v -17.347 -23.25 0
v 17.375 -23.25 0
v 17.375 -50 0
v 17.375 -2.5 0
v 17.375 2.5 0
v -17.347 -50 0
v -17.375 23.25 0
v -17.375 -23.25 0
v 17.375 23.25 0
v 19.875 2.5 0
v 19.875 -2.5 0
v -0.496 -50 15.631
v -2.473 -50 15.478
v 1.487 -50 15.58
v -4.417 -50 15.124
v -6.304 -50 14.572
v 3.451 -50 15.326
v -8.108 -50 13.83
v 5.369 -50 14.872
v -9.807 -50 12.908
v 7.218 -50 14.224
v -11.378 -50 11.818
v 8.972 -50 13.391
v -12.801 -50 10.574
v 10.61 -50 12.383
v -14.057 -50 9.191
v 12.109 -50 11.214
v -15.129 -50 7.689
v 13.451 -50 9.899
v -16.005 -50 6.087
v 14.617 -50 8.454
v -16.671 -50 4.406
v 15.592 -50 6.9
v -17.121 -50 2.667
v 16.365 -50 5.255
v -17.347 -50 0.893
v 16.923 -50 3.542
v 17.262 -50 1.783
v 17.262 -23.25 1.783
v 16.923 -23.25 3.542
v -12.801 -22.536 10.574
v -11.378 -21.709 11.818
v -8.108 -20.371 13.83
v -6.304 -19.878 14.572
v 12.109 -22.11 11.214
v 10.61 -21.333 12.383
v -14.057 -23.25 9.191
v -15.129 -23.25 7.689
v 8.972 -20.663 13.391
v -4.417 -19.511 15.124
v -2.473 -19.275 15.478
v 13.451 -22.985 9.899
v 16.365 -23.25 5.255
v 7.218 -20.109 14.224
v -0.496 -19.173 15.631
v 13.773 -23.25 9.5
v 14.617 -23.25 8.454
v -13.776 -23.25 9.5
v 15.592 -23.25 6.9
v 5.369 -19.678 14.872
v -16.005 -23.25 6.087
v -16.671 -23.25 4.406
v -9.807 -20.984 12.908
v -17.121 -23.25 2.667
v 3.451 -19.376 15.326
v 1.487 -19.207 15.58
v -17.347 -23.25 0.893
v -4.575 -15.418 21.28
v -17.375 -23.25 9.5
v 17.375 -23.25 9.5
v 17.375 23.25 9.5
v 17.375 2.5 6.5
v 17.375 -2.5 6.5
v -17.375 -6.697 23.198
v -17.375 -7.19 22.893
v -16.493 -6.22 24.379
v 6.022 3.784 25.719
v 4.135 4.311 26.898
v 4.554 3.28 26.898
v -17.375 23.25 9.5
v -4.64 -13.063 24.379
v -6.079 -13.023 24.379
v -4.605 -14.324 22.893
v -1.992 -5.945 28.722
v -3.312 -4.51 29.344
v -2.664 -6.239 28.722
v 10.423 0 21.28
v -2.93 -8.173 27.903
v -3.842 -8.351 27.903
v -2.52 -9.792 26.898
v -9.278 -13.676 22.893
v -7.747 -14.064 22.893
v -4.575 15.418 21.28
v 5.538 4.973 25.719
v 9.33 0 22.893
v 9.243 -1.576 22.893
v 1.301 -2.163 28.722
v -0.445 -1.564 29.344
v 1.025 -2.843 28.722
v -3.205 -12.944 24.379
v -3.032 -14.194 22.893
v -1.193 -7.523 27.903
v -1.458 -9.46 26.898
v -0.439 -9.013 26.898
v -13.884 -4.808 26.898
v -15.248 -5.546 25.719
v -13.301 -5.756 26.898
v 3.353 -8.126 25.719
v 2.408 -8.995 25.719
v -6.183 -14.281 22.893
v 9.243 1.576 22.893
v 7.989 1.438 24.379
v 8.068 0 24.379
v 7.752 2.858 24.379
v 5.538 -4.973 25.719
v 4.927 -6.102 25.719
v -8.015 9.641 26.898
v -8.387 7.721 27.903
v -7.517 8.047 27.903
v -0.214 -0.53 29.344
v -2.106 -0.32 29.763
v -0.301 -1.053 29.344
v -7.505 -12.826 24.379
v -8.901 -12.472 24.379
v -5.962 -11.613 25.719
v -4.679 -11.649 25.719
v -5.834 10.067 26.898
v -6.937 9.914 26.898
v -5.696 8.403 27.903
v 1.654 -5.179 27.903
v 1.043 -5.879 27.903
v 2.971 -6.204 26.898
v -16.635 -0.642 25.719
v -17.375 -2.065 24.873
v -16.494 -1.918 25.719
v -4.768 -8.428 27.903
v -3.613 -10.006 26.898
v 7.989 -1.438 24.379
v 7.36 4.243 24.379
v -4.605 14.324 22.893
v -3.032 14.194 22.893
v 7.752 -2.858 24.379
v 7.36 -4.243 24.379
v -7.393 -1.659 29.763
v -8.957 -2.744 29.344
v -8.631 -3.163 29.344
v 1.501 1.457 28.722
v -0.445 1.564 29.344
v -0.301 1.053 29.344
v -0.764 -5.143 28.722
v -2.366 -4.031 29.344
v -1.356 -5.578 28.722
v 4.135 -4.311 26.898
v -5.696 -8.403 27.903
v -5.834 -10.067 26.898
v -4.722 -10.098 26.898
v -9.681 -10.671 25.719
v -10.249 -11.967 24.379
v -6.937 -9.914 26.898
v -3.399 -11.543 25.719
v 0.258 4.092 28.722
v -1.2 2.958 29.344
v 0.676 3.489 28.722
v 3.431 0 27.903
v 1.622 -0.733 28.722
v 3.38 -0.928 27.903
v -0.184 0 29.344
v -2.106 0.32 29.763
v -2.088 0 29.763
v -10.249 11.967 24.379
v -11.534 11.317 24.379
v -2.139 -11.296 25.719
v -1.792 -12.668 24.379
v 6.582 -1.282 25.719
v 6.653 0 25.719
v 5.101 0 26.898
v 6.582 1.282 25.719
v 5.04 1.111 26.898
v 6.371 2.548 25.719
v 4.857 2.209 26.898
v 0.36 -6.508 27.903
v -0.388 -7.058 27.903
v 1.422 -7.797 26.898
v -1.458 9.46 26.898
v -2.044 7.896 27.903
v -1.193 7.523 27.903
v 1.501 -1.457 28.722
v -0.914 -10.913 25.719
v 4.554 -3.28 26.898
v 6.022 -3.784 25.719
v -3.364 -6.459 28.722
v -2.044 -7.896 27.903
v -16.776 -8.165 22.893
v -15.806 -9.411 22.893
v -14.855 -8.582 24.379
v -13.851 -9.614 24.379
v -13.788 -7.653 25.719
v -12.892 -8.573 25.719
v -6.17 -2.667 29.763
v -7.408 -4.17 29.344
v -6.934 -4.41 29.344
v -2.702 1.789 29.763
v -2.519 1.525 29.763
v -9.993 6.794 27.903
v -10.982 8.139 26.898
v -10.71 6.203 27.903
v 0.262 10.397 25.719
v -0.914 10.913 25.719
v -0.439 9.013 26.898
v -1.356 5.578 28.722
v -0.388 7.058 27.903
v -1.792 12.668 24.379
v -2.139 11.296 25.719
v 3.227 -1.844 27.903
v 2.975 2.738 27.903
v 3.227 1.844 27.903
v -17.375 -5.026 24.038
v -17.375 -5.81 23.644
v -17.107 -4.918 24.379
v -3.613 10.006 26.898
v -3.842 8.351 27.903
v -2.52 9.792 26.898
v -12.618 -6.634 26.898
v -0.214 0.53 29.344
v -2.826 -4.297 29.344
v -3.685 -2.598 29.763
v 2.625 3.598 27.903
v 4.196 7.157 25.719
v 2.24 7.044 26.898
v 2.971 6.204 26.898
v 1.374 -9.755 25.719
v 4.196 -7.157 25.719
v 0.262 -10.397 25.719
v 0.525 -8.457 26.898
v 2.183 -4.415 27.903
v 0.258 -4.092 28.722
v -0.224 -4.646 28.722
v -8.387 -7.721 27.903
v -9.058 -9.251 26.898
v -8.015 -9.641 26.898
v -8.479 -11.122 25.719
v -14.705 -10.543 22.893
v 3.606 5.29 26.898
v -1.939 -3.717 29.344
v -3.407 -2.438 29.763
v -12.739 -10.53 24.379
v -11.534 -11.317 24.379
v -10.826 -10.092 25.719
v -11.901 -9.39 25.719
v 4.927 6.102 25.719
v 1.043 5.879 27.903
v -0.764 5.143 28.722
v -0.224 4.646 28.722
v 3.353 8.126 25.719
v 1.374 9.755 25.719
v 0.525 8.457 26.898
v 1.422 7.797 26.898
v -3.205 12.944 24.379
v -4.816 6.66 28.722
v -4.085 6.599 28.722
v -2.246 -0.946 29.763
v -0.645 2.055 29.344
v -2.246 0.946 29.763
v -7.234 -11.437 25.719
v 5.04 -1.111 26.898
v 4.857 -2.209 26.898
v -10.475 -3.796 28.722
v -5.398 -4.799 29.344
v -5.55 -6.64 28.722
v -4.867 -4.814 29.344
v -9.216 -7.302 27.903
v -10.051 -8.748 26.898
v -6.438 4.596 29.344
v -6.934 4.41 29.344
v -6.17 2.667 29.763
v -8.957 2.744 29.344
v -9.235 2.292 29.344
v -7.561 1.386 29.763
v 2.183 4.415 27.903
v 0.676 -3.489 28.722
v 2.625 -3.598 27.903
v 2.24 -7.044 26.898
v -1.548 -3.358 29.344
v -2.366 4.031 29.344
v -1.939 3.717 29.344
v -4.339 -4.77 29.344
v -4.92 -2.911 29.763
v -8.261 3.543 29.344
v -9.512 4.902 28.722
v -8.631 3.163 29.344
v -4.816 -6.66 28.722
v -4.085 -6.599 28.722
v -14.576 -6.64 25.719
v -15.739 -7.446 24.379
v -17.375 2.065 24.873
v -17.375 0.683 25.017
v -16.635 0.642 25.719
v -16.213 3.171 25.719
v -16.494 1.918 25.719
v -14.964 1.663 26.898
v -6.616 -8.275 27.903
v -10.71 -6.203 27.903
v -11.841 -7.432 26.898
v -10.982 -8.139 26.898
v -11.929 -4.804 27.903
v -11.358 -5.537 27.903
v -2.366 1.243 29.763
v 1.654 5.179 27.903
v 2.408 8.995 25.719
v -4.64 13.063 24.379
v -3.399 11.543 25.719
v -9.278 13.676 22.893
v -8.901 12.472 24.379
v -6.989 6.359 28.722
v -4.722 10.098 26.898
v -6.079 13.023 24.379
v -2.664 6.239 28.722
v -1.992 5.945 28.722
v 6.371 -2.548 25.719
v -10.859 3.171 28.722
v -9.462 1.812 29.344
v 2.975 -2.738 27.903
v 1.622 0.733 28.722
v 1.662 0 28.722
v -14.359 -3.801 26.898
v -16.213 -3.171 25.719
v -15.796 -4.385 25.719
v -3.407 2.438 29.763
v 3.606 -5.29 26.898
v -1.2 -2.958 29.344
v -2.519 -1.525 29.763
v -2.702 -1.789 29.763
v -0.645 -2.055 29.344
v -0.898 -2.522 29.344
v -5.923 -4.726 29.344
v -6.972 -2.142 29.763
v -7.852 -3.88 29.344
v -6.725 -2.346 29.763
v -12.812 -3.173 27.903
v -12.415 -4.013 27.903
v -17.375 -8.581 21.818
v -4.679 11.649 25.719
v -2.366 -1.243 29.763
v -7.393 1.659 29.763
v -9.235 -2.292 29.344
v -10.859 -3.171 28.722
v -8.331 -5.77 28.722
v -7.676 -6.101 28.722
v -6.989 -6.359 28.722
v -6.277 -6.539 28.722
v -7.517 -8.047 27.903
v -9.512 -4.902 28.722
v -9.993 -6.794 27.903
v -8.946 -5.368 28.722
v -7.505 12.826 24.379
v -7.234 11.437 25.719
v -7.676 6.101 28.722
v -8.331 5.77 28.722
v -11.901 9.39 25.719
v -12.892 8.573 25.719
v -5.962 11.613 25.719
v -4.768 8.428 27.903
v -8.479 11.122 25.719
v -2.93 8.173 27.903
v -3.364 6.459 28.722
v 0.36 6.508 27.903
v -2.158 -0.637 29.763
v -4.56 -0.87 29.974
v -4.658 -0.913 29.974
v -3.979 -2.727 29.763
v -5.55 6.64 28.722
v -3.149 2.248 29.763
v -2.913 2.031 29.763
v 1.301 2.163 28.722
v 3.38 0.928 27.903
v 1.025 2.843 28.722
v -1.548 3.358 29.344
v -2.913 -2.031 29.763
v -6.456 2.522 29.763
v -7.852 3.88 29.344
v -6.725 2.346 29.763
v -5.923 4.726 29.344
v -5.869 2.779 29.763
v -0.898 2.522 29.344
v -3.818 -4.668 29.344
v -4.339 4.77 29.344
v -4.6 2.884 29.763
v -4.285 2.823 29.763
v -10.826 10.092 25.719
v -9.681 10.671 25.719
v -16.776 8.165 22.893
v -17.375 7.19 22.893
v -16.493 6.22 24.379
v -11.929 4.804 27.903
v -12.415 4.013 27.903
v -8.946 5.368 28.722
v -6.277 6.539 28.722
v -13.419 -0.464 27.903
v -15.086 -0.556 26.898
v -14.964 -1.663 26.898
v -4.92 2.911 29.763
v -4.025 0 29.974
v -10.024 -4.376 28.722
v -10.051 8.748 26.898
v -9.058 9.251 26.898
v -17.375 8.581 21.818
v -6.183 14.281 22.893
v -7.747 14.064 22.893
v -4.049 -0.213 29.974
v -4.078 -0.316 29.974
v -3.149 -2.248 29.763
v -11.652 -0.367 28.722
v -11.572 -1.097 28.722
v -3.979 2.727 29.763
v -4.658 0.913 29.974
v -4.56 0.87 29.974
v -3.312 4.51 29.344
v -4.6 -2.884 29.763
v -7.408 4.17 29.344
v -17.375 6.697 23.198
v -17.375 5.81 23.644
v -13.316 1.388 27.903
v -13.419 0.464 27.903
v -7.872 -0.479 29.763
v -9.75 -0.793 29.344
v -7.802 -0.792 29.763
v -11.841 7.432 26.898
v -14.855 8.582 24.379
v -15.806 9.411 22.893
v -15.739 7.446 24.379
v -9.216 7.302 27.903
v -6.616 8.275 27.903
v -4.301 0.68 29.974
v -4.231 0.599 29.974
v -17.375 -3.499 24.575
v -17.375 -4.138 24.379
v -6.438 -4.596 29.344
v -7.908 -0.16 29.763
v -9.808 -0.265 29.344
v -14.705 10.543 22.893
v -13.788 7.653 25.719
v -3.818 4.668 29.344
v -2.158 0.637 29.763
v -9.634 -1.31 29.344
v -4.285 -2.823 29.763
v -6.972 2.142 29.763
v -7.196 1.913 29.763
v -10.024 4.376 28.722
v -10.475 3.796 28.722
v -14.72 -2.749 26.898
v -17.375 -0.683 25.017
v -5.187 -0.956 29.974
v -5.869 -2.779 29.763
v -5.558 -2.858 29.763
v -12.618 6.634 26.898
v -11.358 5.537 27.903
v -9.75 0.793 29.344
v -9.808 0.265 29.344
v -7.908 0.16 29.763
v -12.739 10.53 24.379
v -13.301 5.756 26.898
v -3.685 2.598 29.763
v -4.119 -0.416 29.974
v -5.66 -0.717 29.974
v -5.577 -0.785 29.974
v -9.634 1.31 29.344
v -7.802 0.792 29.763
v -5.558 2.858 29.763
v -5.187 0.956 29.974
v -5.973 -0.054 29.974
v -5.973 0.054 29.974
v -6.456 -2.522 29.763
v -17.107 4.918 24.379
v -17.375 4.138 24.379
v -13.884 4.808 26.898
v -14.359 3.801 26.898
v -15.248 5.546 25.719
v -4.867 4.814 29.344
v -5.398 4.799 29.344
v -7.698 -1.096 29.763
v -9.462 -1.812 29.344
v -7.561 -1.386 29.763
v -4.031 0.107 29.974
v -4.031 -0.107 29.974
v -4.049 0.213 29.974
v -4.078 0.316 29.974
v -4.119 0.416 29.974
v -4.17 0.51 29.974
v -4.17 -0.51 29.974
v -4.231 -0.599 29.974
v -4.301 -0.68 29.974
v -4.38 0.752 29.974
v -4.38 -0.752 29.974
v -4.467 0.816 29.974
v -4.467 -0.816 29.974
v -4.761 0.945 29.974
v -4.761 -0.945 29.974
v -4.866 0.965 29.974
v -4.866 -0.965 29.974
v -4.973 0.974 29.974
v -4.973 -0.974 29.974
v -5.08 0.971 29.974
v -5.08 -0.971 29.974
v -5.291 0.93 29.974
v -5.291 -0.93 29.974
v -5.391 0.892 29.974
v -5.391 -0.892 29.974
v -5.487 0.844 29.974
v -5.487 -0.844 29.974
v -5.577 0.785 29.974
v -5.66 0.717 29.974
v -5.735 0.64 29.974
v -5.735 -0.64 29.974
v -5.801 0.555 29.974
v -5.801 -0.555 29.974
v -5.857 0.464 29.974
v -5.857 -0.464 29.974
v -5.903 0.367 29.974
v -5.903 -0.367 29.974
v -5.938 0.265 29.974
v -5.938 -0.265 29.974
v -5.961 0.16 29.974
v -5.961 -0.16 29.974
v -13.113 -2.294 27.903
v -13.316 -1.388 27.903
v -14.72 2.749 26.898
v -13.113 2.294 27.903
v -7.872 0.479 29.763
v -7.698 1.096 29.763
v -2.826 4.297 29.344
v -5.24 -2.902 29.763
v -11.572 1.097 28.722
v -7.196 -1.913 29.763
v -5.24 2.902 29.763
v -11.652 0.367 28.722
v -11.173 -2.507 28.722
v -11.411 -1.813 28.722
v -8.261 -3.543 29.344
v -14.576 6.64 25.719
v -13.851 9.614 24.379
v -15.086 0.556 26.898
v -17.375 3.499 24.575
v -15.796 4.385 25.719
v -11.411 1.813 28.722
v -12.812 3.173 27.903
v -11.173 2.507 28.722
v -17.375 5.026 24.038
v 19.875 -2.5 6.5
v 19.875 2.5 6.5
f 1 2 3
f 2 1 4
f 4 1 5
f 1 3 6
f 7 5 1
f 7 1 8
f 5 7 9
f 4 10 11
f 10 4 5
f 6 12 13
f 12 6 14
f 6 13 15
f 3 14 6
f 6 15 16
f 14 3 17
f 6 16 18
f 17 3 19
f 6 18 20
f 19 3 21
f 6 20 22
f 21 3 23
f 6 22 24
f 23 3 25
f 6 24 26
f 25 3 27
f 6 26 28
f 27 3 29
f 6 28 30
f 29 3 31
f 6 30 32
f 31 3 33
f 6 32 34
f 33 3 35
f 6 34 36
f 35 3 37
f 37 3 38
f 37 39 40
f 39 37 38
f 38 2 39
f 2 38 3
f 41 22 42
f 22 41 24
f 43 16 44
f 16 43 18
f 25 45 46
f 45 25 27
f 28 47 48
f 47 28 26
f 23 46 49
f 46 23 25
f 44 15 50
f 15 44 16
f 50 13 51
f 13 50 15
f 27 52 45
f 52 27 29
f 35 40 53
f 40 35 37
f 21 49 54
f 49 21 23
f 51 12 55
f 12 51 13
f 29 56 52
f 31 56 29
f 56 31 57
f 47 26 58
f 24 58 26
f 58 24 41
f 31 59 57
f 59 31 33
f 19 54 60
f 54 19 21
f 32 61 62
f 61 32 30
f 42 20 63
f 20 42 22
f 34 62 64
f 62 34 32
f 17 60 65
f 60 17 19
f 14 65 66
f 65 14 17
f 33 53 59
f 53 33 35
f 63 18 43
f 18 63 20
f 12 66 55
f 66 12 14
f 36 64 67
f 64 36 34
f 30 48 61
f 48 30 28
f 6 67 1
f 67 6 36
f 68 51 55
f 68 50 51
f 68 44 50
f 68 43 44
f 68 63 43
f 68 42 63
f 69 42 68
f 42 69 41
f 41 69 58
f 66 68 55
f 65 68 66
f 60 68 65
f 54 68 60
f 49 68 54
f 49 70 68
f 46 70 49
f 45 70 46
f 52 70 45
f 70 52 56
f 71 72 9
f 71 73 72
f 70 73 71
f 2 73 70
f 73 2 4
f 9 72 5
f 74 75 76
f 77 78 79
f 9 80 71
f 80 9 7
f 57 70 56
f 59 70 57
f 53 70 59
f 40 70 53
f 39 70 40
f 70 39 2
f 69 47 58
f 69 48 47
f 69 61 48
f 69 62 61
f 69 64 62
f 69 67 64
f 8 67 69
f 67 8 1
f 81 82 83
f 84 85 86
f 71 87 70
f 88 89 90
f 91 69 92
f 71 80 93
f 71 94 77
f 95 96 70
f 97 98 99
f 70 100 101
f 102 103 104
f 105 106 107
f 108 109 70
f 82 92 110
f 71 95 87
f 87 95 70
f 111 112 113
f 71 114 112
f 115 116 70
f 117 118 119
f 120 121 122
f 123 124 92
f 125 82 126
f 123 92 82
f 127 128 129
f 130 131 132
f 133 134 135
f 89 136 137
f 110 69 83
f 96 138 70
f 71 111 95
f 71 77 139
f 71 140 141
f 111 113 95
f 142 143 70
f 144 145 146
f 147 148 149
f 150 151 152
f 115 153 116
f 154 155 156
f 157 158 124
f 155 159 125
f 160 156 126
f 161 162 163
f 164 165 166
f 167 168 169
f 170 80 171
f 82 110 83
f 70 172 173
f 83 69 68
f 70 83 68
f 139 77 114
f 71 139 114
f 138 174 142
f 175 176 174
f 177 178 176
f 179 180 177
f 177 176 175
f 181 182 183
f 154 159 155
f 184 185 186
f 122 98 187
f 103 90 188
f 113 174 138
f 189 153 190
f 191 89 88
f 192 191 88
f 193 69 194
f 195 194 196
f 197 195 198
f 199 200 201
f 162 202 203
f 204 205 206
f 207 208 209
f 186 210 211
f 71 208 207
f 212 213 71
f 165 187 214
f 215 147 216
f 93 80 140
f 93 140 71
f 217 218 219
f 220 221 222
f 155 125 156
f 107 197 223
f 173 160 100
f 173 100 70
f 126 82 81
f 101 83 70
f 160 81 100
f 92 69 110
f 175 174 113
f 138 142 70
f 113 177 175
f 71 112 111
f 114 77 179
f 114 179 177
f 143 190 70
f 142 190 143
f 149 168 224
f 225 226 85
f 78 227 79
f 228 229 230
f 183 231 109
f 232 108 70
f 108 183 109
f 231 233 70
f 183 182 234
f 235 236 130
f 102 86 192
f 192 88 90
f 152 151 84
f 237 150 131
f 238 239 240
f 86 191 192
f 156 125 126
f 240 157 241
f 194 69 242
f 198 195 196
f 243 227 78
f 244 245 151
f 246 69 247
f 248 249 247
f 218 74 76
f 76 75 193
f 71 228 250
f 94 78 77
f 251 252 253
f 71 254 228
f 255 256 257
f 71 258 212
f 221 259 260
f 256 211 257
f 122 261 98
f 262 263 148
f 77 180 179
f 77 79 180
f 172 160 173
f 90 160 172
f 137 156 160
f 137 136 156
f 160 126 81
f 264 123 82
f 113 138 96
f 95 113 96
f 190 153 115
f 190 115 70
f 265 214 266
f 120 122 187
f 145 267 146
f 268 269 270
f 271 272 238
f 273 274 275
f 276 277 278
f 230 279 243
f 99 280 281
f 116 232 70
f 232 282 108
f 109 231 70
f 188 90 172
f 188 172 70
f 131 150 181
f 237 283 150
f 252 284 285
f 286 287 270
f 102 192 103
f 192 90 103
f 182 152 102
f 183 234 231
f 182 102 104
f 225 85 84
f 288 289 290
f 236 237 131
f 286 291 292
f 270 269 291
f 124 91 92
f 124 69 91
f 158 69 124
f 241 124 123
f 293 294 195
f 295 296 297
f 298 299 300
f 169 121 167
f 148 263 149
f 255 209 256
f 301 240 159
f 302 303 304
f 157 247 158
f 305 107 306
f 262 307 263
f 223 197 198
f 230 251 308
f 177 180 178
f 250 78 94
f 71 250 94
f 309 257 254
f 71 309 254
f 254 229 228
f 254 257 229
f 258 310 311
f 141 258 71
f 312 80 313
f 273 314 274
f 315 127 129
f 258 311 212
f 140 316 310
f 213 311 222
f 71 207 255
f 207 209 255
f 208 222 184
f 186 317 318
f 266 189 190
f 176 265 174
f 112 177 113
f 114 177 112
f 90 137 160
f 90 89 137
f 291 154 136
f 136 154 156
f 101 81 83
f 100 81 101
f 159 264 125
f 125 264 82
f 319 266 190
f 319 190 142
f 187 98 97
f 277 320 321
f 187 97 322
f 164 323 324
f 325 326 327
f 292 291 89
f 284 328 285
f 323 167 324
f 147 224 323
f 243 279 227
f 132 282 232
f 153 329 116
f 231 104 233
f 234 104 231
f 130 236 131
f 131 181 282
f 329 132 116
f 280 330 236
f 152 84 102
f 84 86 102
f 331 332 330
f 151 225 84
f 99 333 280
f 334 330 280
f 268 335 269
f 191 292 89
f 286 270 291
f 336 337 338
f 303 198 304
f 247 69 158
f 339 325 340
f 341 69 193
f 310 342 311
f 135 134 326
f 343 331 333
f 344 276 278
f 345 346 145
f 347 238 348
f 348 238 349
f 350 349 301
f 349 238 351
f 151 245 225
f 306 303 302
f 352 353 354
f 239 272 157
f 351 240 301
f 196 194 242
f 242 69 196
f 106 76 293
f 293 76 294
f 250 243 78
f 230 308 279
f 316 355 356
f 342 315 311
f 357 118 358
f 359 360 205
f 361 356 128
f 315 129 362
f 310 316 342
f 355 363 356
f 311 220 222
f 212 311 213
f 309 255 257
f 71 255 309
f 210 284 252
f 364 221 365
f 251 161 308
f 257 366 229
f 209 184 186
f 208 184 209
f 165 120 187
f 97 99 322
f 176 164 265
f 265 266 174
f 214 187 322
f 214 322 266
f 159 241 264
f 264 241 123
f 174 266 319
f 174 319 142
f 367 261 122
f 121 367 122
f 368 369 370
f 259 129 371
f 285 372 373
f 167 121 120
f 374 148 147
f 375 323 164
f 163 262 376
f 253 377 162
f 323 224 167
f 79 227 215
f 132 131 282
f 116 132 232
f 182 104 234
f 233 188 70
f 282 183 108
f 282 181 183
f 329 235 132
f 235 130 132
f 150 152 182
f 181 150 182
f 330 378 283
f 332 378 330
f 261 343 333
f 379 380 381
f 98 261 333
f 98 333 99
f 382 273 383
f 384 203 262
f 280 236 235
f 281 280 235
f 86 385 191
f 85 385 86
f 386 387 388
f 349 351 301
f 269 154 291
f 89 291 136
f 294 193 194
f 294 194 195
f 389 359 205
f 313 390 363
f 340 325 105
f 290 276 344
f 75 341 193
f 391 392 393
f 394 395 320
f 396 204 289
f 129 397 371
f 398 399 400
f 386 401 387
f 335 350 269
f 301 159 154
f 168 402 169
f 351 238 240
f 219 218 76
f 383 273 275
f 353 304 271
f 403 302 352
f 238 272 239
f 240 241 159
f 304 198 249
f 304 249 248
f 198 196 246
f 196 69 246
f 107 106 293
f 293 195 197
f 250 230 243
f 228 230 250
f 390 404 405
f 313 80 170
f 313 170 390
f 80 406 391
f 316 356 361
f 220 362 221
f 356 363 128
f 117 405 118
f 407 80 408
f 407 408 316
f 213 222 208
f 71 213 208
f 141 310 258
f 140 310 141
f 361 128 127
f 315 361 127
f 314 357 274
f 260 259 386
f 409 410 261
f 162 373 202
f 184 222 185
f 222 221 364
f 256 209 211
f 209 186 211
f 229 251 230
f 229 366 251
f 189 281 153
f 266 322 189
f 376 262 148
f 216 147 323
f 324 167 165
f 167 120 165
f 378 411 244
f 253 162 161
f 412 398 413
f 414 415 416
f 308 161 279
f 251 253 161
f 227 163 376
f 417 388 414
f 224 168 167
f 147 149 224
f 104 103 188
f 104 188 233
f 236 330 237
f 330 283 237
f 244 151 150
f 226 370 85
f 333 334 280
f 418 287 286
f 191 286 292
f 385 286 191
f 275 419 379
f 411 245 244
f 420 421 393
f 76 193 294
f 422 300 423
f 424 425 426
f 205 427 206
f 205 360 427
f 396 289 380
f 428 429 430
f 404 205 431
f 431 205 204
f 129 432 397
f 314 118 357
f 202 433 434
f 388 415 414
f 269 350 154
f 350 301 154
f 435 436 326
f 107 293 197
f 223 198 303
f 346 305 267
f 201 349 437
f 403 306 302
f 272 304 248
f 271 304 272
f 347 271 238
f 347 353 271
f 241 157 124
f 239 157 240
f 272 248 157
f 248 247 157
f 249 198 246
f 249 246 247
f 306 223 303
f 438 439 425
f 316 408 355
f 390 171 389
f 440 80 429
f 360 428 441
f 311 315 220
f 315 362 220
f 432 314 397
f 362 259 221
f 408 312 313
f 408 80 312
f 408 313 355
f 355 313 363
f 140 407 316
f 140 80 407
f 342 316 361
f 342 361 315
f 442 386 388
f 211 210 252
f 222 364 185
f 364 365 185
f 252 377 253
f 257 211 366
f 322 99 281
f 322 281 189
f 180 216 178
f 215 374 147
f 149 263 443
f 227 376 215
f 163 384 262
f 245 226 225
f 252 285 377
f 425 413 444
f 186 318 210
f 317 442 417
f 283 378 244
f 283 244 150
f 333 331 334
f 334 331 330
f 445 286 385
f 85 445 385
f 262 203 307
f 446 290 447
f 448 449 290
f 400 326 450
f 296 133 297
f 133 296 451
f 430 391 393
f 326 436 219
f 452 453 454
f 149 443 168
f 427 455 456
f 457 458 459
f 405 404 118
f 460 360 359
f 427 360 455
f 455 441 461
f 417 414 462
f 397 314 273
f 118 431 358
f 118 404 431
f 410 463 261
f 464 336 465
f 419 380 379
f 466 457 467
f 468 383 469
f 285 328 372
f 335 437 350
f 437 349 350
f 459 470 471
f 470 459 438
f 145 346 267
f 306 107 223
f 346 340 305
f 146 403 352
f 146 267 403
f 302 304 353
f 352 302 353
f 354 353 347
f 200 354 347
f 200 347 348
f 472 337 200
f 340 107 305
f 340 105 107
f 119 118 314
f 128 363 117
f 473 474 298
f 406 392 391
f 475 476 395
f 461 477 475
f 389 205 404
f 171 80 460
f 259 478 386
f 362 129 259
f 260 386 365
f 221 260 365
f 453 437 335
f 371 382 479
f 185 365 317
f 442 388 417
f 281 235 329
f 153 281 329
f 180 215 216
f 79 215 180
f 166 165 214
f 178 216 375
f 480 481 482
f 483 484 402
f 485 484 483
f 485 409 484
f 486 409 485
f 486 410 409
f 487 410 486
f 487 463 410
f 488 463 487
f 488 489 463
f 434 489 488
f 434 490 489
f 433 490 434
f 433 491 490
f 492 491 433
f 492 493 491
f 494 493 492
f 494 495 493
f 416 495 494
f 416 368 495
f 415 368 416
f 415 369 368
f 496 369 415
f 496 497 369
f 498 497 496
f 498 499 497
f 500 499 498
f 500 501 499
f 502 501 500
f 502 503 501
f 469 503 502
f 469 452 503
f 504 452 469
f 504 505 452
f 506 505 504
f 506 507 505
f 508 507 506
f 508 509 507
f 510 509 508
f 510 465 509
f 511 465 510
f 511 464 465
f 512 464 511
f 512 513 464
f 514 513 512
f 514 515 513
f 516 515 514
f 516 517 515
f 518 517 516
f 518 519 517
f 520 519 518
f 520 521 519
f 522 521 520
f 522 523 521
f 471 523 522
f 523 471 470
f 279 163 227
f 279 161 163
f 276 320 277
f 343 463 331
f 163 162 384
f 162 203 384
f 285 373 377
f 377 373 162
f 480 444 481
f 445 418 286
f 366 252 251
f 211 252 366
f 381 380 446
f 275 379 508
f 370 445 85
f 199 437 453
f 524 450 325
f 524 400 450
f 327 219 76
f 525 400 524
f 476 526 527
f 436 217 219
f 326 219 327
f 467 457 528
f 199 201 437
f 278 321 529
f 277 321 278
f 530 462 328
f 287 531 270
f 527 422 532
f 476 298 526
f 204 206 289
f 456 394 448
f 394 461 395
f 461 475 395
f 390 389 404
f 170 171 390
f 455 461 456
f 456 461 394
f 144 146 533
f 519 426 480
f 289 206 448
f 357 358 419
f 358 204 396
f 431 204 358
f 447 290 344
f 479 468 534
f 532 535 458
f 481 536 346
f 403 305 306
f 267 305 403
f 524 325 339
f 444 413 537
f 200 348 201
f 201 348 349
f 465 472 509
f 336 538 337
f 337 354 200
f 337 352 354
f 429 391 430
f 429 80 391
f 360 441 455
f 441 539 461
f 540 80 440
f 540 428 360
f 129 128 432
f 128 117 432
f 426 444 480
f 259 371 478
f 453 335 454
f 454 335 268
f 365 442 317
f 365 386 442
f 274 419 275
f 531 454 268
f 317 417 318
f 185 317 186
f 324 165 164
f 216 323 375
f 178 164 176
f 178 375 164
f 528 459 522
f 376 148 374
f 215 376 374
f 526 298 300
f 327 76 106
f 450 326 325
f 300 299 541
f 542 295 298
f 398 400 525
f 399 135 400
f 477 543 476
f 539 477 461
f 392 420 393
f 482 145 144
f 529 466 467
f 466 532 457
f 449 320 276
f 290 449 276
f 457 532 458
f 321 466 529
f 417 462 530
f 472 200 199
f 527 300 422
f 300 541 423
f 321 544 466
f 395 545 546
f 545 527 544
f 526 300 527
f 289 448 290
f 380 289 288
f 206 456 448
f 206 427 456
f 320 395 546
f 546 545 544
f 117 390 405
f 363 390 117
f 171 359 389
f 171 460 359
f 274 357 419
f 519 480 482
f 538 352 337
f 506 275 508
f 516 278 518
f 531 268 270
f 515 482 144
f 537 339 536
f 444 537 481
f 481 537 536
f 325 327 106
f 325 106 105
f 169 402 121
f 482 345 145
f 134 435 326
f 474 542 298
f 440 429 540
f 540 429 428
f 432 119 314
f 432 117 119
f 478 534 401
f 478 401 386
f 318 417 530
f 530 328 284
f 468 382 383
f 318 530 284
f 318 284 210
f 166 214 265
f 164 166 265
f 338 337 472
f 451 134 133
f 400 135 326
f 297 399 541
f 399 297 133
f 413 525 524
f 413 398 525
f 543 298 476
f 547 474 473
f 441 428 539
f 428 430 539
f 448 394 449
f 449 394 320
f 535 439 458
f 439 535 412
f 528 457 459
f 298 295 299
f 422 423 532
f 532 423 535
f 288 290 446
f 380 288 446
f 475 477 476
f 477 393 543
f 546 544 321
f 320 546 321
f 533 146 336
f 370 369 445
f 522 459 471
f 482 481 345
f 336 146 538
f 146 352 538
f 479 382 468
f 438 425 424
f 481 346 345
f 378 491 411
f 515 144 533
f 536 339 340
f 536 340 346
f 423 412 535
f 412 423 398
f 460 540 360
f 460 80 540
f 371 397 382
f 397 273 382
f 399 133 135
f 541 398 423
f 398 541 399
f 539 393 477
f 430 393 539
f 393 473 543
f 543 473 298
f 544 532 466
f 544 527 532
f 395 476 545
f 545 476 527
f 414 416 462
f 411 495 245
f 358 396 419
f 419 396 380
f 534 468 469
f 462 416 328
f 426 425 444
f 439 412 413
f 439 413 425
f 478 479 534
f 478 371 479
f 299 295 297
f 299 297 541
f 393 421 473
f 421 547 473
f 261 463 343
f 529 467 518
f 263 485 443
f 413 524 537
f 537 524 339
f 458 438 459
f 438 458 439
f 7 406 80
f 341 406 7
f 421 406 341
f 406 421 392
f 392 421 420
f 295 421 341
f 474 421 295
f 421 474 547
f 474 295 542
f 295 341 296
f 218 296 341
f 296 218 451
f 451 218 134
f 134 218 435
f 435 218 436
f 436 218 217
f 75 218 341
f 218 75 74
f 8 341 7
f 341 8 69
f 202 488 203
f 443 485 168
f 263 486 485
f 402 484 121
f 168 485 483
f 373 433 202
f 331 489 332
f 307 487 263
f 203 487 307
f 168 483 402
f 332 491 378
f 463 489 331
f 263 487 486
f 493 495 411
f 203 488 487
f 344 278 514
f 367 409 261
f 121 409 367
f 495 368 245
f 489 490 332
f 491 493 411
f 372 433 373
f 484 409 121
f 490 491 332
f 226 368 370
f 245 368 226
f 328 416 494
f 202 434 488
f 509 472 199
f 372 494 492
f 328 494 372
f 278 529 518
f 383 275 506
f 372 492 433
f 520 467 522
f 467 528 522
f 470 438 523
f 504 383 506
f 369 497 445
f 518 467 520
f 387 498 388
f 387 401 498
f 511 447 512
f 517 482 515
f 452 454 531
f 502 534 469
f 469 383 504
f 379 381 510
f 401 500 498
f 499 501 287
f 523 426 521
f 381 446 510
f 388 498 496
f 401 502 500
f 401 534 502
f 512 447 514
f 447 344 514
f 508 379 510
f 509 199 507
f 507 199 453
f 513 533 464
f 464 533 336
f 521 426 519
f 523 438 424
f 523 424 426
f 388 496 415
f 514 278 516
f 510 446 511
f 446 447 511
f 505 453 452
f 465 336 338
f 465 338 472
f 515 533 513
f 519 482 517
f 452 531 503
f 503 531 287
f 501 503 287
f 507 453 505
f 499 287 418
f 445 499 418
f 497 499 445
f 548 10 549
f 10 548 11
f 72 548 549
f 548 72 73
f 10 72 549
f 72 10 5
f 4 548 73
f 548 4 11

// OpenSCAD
use <trackball.scad>
// Breadboard cutout test

difference()
{
    // Uncomment this to make a hollow shell with the breadboard cutout inside
    // minkowski()
    // {
    //     breadboard_cutout();
    //     intersection()
    //     {
    //         $fn = 15;
    //         sphere(r=1);
    //         ccube(10, 10, 10);
    //     }
    // }

    breadboard_cutout();
}
